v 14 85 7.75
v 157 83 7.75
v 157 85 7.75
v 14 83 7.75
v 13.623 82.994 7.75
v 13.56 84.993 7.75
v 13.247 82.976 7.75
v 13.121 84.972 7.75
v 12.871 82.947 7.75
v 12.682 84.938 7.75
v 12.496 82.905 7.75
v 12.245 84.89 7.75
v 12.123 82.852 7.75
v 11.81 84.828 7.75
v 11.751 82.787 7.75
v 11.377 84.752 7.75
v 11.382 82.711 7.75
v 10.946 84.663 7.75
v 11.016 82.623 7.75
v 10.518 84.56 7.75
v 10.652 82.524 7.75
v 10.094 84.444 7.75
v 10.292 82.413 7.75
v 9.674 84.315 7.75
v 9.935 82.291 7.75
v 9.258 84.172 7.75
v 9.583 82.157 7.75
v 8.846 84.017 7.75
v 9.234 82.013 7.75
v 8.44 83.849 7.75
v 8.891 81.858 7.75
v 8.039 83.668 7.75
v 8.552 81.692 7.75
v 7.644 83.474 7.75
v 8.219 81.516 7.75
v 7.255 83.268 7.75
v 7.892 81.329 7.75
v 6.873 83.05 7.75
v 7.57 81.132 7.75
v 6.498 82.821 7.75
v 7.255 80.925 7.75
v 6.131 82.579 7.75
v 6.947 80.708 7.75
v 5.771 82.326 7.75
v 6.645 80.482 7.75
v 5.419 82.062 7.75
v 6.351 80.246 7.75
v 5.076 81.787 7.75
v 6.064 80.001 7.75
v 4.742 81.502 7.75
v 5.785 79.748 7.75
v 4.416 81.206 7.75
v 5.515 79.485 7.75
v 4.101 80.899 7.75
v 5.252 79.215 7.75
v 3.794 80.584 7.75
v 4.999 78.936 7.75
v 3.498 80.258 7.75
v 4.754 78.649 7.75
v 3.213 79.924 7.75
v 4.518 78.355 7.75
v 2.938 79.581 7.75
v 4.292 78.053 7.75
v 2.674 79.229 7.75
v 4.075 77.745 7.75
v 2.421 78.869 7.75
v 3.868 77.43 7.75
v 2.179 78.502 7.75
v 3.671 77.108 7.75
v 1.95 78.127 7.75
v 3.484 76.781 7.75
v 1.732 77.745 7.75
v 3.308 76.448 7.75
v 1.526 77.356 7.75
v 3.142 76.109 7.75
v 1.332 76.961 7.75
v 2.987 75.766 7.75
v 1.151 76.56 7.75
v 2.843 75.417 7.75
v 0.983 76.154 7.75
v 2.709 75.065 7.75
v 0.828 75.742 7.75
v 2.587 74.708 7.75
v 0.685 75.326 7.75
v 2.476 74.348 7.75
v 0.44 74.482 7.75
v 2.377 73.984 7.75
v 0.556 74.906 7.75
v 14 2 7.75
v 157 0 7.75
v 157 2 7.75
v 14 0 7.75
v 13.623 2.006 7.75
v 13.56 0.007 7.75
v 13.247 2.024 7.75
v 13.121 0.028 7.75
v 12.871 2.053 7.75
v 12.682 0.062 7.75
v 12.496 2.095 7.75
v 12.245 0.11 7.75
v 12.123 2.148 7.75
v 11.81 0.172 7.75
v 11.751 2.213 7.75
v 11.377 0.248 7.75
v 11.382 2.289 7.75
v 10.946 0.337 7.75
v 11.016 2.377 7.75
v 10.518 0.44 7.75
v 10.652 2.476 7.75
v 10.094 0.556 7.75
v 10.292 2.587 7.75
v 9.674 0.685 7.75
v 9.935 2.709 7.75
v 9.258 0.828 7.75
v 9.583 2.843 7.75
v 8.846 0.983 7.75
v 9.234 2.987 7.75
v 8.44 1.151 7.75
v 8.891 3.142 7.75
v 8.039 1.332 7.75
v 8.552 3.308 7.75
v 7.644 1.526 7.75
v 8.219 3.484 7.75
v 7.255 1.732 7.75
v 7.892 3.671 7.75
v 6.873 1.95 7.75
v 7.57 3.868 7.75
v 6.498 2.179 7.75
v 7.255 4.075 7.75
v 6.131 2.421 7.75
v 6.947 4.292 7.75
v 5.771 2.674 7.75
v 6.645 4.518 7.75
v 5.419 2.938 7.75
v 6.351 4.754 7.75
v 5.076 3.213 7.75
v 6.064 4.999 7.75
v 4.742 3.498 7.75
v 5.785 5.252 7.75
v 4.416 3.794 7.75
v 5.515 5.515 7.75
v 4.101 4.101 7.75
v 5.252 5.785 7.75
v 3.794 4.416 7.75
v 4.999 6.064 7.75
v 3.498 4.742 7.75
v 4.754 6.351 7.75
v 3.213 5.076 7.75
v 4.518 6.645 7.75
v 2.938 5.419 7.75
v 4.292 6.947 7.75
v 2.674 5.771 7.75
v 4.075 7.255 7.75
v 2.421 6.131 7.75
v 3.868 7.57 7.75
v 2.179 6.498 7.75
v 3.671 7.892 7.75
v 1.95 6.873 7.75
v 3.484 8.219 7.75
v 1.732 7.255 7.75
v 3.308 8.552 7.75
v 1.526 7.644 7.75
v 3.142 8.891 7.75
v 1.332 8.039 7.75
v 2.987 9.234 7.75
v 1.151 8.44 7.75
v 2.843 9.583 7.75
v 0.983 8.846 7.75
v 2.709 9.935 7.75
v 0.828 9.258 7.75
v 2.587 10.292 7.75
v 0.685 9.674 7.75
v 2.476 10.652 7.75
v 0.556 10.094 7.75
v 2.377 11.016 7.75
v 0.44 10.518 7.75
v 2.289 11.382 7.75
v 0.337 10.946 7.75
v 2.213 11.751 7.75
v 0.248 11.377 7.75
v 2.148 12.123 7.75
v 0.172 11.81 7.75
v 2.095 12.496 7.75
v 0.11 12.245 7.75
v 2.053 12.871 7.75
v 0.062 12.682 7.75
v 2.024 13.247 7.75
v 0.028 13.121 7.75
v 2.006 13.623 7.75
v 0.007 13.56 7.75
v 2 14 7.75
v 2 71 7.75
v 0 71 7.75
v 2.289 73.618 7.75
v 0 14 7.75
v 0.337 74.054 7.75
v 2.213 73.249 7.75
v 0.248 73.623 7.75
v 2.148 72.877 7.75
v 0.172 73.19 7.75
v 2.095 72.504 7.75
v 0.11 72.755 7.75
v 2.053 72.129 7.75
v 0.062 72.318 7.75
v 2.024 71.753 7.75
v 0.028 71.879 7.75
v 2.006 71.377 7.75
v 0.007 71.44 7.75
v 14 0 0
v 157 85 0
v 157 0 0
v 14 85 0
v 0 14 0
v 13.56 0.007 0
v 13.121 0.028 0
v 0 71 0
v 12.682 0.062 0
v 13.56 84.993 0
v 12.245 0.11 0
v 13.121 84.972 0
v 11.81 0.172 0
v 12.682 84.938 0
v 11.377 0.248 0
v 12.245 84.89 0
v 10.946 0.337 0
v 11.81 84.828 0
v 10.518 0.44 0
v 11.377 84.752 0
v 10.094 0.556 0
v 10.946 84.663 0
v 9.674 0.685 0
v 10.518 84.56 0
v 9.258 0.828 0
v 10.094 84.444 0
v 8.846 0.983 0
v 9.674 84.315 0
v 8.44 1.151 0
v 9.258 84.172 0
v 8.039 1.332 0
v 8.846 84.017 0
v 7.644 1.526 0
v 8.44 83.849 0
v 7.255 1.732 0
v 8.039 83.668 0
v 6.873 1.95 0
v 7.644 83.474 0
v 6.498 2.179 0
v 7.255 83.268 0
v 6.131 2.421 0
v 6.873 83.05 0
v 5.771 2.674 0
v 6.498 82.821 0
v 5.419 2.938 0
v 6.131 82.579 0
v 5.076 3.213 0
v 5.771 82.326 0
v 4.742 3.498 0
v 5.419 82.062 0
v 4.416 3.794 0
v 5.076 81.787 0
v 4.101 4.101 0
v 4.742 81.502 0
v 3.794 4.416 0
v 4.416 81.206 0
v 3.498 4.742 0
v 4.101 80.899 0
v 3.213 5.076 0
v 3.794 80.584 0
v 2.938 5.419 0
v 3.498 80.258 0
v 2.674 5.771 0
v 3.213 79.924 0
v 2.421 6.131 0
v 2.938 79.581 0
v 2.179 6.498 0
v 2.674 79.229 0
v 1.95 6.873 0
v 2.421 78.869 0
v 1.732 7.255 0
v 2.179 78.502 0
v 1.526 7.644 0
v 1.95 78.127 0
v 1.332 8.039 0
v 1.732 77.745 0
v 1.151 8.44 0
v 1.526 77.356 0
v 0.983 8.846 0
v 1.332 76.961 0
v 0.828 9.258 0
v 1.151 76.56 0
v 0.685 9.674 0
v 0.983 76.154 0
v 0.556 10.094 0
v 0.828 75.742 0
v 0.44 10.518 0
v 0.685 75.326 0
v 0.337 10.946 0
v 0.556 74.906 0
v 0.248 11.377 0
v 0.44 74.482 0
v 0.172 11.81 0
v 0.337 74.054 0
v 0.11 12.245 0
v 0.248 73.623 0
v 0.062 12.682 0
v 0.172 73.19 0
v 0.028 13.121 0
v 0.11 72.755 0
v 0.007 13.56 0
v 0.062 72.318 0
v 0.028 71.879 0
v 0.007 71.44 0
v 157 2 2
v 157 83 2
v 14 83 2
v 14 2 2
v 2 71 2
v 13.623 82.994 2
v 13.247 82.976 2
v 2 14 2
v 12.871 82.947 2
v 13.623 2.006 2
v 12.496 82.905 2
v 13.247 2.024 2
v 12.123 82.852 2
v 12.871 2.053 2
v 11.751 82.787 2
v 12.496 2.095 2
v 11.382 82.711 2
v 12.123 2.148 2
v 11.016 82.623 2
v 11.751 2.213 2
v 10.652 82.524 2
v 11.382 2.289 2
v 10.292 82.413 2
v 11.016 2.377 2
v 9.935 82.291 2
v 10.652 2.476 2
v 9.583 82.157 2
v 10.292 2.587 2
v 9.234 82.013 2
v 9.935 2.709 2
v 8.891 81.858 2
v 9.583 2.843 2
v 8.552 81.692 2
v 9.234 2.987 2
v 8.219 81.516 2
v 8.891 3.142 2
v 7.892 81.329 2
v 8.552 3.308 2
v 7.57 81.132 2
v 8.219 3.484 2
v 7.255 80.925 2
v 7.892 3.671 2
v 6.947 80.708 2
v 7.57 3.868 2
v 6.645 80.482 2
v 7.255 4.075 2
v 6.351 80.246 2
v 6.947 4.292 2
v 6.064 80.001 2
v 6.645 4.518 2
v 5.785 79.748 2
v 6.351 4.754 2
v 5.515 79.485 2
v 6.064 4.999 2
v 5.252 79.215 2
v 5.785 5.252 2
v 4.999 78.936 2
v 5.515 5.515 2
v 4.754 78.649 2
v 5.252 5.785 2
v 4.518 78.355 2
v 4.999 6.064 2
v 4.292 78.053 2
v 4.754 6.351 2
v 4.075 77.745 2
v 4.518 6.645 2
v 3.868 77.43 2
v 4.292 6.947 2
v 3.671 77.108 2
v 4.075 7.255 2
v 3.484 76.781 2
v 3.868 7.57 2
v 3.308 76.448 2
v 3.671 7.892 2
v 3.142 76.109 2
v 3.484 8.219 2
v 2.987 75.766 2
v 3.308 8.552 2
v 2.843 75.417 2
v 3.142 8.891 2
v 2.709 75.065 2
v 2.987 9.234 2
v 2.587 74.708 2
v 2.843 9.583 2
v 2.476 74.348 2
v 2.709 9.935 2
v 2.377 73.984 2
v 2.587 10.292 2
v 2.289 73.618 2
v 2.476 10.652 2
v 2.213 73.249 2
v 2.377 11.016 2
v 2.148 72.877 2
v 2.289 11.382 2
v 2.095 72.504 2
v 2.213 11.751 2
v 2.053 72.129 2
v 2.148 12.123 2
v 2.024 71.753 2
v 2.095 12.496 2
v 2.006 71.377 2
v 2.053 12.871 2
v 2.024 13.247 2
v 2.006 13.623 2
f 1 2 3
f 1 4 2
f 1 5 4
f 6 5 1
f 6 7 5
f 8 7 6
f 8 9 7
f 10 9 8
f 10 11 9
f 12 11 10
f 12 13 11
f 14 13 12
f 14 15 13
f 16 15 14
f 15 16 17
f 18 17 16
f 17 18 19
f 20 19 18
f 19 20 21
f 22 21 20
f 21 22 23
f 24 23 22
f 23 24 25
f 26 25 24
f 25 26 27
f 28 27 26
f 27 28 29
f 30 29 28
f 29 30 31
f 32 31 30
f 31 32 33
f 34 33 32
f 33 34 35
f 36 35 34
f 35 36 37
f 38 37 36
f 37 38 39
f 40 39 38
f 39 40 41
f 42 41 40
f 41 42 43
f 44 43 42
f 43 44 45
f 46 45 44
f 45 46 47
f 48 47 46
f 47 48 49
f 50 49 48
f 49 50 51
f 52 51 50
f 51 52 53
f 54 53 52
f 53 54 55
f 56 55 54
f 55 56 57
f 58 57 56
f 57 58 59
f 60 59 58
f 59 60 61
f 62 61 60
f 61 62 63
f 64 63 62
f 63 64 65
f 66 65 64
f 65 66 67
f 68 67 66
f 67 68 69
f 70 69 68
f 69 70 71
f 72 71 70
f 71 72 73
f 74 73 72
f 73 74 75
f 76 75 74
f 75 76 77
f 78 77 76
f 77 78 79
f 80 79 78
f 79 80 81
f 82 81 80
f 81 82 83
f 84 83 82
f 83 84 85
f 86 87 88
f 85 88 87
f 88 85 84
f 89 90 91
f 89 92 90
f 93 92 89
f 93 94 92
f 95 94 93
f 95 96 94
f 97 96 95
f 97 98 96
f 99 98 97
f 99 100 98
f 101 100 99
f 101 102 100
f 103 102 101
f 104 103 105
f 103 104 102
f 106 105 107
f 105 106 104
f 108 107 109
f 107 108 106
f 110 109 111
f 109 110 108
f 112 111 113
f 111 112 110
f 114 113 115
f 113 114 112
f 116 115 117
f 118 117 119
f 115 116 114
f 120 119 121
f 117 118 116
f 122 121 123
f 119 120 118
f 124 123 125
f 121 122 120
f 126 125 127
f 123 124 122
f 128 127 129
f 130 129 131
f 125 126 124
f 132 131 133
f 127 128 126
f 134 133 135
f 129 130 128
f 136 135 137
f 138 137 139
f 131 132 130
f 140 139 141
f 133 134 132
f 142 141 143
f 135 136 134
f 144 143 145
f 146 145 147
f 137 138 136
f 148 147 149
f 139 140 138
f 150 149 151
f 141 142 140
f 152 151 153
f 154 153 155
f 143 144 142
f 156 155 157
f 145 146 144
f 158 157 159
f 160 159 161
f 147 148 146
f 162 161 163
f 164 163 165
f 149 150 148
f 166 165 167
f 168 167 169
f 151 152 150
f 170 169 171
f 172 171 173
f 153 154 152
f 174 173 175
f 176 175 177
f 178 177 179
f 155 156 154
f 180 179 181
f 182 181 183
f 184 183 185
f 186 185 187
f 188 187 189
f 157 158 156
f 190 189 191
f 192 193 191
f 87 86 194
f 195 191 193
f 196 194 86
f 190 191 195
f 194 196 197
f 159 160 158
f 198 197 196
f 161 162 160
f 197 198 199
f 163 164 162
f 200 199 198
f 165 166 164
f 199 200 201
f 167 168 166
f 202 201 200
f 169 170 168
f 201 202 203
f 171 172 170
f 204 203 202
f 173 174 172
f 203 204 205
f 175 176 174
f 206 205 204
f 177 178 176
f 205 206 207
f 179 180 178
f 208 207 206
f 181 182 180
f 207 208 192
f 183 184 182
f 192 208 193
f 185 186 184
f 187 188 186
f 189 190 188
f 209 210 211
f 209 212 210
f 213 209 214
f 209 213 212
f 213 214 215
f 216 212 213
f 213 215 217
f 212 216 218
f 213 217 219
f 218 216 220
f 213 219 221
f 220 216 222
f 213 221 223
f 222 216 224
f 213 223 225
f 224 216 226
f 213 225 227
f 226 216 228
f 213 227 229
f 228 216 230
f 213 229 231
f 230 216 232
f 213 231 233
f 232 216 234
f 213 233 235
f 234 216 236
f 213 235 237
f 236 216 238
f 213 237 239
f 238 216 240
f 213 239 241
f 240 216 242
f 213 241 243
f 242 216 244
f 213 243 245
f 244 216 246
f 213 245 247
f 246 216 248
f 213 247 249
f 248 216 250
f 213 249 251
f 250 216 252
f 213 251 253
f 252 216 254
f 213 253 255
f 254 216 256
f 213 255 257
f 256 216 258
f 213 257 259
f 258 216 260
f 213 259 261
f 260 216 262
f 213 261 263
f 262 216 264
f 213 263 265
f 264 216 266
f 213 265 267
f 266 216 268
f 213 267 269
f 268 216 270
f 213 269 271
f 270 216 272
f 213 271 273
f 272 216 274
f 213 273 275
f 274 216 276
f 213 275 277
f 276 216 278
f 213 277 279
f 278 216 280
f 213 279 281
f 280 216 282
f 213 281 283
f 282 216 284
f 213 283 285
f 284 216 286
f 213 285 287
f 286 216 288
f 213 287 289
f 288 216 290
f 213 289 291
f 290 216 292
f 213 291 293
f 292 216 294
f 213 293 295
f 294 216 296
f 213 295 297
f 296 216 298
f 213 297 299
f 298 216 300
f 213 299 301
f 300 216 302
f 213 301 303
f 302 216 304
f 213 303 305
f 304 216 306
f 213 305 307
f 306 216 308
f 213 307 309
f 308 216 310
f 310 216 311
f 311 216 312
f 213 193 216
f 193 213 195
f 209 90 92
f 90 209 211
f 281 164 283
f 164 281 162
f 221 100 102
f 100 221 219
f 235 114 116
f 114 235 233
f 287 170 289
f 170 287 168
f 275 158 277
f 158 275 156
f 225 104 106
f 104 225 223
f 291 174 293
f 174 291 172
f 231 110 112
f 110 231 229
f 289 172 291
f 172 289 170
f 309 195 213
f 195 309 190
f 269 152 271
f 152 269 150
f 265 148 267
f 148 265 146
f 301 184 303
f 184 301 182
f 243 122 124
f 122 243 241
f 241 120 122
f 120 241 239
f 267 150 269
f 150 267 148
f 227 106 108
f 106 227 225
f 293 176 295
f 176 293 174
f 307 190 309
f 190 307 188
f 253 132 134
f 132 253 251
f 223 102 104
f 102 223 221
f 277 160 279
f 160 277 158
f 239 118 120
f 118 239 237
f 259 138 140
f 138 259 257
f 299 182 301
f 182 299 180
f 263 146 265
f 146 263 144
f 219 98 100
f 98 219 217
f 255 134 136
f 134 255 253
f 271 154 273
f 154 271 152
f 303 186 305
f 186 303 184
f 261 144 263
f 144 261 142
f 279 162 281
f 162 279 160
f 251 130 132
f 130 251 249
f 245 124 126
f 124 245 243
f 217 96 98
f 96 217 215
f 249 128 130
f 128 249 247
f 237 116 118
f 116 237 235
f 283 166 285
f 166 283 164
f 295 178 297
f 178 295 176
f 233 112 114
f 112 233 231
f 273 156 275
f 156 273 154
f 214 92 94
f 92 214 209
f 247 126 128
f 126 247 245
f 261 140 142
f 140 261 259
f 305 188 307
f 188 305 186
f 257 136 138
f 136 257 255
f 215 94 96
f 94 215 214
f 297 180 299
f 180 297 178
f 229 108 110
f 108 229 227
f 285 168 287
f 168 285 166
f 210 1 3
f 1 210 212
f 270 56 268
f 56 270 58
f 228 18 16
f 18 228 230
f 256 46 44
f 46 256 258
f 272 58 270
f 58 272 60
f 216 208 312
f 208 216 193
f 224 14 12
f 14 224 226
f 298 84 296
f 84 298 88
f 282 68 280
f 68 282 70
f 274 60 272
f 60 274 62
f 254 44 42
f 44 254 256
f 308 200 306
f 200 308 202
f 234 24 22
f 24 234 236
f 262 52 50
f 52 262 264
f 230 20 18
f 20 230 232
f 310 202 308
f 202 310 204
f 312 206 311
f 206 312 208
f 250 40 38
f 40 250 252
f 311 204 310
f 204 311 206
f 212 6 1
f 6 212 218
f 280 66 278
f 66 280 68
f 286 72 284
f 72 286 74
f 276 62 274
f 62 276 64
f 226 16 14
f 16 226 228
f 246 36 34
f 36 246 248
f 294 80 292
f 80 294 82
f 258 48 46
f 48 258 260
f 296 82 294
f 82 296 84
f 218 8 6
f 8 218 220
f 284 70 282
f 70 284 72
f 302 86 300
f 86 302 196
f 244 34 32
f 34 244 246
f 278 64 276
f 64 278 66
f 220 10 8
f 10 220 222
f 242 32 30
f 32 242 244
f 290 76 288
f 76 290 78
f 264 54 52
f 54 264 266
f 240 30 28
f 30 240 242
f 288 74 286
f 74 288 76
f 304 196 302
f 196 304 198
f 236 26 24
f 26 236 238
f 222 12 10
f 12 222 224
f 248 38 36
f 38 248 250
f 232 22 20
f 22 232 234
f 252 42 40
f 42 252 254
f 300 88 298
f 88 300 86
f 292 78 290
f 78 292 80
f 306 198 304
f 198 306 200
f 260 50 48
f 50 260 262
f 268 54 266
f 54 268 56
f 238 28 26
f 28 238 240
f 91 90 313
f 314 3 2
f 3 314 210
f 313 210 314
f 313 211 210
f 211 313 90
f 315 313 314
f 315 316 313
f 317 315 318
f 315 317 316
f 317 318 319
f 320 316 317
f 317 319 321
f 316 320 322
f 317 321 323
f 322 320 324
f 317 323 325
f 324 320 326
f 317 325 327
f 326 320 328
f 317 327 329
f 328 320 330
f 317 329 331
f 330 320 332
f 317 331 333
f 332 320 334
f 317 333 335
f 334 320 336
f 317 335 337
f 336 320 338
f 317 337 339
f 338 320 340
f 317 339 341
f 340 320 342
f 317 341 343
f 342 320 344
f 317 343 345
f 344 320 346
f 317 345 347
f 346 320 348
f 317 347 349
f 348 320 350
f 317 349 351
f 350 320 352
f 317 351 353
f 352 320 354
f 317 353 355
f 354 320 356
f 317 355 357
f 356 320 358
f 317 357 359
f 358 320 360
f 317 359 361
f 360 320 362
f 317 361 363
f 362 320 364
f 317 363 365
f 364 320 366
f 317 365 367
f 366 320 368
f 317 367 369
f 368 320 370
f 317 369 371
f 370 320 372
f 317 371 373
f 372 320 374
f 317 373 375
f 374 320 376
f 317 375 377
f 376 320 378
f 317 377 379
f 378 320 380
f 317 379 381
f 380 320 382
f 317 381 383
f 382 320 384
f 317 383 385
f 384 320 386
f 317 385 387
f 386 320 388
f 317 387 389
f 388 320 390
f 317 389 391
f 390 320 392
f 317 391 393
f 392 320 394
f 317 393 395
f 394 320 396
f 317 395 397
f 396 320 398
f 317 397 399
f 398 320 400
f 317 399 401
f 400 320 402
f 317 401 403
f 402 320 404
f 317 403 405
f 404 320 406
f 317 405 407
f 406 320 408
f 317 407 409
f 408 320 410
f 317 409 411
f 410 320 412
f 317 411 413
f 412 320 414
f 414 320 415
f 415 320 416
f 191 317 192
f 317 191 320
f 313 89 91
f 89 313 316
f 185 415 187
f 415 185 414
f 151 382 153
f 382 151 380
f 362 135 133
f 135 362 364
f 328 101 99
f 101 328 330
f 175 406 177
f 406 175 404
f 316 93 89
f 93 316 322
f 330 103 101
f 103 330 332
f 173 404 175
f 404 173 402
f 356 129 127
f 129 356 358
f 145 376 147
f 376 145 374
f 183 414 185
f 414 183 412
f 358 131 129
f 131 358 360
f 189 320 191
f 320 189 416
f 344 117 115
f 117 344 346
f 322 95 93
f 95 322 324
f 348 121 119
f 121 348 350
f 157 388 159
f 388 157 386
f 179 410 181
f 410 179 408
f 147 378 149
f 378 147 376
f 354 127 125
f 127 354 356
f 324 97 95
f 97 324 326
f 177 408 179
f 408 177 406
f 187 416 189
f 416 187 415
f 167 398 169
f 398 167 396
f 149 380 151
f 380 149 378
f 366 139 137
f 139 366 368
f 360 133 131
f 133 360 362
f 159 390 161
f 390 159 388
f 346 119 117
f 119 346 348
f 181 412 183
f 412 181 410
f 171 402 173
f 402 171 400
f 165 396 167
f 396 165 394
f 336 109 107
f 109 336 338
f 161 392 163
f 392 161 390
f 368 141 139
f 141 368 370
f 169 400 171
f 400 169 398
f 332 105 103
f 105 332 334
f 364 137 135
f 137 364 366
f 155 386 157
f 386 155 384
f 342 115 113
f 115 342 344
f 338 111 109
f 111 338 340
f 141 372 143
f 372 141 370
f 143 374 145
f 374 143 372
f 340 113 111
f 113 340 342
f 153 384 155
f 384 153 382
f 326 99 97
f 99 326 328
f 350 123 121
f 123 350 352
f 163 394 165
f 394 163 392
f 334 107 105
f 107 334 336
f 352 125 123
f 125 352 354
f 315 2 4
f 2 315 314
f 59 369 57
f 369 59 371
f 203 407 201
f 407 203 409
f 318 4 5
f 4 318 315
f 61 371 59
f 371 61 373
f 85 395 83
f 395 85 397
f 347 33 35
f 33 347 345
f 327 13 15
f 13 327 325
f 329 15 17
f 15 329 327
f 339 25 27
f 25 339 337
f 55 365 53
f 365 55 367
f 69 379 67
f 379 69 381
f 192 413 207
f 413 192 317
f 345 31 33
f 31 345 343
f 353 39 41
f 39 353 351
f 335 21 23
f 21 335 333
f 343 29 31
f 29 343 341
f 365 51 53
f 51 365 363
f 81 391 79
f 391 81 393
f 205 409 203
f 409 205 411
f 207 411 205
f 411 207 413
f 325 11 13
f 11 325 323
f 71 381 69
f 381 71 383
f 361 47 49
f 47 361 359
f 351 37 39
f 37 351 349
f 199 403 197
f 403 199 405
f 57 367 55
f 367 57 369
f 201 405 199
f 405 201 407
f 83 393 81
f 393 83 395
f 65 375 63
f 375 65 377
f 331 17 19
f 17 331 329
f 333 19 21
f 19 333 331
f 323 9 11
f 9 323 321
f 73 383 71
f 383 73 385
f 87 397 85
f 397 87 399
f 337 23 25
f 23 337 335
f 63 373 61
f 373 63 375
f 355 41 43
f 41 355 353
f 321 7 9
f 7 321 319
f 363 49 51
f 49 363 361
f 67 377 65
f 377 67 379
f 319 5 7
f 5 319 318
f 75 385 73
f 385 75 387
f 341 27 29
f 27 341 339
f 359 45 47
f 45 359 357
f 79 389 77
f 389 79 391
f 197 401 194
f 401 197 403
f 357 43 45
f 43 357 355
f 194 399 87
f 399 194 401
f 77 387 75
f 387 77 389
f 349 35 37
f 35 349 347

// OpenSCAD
//
// Gallaxy S5 with otterbox defender pocket protector

//dimensions (all in mm)
FN = 200;//$fn for cylinders
//FN = 34;//$fn for cylinders

L = 155;
W = 81;
H = 5.75;
THK = 2;
R = 12;
R_O = R+THK;

cover();

module cover()
{
    //translate([30,30,30])
    difference()
    {
        cover_body();
        translate([THK,THK,THK])
        S5_body([50,50,50]);
    }
}

module cover_body()
{
    difference()
    {
        cube([L+THK,W+2*THK,H+THK]);
        //union()
        {
            //subtract the first corner
            difference()
            {
                cube([R_O, R_O,(H+THK)]);
                translate([R_O,R_O,0])
                rotate([0,0,180])
                    cylinder(H+THK, r=R_O, $fn = FN);
            }
            //subtract the second corner
            translate([0,(W+2*THK)-2*R_O,0])
            difference()
            {
                translate([0,R_O,0])
                cube([R_O, R_O,(H+THK)]);
                translate([R_O,R_O,0])
                rotate([0,0,180])
                cylinder(H+THK, r=R_O, $fn = FN);
            }
        }
    }
}

module S5_body()
{
    difference()
    {
        cube([L,W,H]);
        //union()
        {
            //subtract the first corner
            difference()
            {
                cube([R, R,(H)]);
                translate([R,R,0])
                rotate([0,0,180])
                    cylinder(H, r=R, $fn = FN);
            }
            //subtract the second corner
            translate([0,(W)-2*R,0])
            difference()
            {
                translate([0,R,0])
                cube([R, R,(H)]);
                translate([R,R,0])
                rotate([0,0,180])
                cylinder(H, r=R, $fn = FN);
            }
        }
    }
}
